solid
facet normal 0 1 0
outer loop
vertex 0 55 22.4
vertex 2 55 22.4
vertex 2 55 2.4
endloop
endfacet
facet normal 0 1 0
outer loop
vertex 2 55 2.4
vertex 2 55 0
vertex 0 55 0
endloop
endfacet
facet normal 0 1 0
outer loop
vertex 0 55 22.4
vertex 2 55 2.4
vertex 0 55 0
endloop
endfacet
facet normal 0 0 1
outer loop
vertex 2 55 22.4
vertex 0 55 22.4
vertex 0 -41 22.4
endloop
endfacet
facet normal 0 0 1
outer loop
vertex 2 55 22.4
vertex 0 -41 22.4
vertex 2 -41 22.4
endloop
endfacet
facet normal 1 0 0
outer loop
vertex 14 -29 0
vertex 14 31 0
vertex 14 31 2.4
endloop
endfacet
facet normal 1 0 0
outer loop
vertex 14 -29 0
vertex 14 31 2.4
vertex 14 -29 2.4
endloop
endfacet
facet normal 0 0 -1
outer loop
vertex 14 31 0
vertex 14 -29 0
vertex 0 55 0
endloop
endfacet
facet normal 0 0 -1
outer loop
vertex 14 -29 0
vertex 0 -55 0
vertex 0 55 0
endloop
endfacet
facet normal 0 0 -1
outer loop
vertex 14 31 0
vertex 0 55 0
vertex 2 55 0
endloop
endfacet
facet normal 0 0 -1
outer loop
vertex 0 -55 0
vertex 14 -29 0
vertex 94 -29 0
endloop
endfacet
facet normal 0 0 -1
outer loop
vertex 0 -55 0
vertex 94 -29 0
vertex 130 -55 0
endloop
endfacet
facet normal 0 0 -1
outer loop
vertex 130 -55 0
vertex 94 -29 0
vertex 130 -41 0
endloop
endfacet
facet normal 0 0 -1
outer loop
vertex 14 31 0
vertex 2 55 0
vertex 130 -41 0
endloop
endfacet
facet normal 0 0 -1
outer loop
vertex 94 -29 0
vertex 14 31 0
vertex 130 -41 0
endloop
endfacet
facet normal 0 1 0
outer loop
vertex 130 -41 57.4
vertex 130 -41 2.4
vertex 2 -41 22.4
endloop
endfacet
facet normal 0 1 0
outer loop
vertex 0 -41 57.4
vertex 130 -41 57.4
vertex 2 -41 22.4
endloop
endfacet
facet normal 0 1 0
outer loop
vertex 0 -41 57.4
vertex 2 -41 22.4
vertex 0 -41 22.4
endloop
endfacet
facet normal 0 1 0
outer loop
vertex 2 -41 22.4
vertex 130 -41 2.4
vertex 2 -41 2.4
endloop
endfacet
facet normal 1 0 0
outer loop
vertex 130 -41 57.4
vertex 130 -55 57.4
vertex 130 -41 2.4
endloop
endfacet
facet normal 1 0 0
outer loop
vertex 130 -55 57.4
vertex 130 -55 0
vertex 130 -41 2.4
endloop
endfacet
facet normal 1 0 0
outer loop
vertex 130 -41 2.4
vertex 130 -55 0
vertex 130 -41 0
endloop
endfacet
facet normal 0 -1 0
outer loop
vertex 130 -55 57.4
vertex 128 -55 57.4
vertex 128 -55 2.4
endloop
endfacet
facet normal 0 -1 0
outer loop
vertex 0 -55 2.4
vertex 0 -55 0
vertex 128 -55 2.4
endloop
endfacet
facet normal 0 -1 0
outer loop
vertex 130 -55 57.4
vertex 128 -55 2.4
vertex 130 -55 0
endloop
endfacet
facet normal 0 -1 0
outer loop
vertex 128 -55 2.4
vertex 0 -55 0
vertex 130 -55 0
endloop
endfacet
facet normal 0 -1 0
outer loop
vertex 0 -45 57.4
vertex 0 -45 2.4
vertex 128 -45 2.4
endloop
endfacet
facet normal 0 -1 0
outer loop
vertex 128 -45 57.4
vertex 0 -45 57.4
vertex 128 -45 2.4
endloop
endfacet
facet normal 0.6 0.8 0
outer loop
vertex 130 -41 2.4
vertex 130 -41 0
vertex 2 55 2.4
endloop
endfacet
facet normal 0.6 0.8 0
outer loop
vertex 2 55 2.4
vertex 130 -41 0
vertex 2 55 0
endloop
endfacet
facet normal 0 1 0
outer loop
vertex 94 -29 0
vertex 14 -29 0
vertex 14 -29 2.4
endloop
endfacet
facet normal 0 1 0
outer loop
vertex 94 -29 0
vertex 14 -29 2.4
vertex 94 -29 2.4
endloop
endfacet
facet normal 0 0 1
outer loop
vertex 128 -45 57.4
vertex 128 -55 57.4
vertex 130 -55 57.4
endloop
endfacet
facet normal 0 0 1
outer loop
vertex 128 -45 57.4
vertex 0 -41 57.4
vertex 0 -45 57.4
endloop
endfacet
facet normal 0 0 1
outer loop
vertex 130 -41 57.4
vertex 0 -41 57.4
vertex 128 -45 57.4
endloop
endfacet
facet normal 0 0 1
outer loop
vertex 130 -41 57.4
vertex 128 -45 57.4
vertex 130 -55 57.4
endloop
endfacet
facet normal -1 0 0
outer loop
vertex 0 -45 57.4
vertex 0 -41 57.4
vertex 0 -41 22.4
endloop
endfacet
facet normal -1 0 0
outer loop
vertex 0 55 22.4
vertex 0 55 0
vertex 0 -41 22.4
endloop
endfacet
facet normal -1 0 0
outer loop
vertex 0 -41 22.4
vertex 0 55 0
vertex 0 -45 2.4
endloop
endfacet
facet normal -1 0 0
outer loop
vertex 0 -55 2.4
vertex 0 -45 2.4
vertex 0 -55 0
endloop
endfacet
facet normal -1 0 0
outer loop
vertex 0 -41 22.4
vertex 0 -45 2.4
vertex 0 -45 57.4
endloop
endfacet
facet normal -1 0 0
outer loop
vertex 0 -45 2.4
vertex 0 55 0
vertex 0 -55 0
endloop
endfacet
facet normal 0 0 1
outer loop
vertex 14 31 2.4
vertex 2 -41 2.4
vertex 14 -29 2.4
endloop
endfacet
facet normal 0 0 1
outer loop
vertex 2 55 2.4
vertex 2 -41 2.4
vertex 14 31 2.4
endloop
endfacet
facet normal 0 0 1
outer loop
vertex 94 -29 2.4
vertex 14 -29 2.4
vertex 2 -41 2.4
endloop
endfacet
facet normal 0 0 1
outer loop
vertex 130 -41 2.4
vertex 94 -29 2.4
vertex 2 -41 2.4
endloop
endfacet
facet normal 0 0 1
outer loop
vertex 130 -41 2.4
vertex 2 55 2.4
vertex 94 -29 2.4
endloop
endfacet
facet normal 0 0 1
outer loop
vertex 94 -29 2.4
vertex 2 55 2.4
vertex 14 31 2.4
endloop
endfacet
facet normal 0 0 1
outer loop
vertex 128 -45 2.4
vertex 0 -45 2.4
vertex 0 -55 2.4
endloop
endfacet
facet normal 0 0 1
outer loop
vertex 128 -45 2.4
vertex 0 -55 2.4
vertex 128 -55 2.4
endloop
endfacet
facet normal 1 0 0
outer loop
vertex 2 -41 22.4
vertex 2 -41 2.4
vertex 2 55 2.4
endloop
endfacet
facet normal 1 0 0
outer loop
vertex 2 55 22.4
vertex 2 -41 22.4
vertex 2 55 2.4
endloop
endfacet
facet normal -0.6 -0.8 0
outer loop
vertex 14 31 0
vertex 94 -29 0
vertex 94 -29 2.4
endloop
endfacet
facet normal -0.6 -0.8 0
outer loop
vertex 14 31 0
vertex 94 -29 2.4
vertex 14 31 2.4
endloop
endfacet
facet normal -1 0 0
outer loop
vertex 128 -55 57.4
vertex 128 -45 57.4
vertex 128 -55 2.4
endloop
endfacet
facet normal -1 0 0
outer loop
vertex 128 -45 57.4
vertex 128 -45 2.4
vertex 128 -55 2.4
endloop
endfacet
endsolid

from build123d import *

# Parameters (mm, degrees)
PAD002_DEPTH = 2.4
PAD003_DEPTH = 20
PAD004_DEPTH = 35


with BuildPart() as part:
    # Sketch007 → Pad002 (new body)
    with BuildSketch(Plane.XY):
        Polygon((0, 55), (0, -55), (130, -55), (130, -41), (2, 55), align=None)
        Polygon((14, 31), (14, -29), (94, -29), align=None, mode=Mode.SUBTRACT)
    extrude(amount=PAD002_DEPTH)

    # Sketch008 → Pad003 (join)
    with BuildSketch(Plane.XY.offset(2.4)):
        Polygon((2, 55), (0, 55), (0, -45), (128, -45), (128, -55), (130, -55), (130, -41), (2, -41), align=None)
    extrude(amount=PAD003_DEPTH)

    # Sketch009 → Pad004 (join)
    with BuildSketch(Plane.XY.offset(22.4)):
        Polygon((0, -45), (128, -45), (128, -55), (130, -55), (130, -41), (0, -41), align=None)
    extrude(amount=PAD004_DEPTH)


solid = part.part
